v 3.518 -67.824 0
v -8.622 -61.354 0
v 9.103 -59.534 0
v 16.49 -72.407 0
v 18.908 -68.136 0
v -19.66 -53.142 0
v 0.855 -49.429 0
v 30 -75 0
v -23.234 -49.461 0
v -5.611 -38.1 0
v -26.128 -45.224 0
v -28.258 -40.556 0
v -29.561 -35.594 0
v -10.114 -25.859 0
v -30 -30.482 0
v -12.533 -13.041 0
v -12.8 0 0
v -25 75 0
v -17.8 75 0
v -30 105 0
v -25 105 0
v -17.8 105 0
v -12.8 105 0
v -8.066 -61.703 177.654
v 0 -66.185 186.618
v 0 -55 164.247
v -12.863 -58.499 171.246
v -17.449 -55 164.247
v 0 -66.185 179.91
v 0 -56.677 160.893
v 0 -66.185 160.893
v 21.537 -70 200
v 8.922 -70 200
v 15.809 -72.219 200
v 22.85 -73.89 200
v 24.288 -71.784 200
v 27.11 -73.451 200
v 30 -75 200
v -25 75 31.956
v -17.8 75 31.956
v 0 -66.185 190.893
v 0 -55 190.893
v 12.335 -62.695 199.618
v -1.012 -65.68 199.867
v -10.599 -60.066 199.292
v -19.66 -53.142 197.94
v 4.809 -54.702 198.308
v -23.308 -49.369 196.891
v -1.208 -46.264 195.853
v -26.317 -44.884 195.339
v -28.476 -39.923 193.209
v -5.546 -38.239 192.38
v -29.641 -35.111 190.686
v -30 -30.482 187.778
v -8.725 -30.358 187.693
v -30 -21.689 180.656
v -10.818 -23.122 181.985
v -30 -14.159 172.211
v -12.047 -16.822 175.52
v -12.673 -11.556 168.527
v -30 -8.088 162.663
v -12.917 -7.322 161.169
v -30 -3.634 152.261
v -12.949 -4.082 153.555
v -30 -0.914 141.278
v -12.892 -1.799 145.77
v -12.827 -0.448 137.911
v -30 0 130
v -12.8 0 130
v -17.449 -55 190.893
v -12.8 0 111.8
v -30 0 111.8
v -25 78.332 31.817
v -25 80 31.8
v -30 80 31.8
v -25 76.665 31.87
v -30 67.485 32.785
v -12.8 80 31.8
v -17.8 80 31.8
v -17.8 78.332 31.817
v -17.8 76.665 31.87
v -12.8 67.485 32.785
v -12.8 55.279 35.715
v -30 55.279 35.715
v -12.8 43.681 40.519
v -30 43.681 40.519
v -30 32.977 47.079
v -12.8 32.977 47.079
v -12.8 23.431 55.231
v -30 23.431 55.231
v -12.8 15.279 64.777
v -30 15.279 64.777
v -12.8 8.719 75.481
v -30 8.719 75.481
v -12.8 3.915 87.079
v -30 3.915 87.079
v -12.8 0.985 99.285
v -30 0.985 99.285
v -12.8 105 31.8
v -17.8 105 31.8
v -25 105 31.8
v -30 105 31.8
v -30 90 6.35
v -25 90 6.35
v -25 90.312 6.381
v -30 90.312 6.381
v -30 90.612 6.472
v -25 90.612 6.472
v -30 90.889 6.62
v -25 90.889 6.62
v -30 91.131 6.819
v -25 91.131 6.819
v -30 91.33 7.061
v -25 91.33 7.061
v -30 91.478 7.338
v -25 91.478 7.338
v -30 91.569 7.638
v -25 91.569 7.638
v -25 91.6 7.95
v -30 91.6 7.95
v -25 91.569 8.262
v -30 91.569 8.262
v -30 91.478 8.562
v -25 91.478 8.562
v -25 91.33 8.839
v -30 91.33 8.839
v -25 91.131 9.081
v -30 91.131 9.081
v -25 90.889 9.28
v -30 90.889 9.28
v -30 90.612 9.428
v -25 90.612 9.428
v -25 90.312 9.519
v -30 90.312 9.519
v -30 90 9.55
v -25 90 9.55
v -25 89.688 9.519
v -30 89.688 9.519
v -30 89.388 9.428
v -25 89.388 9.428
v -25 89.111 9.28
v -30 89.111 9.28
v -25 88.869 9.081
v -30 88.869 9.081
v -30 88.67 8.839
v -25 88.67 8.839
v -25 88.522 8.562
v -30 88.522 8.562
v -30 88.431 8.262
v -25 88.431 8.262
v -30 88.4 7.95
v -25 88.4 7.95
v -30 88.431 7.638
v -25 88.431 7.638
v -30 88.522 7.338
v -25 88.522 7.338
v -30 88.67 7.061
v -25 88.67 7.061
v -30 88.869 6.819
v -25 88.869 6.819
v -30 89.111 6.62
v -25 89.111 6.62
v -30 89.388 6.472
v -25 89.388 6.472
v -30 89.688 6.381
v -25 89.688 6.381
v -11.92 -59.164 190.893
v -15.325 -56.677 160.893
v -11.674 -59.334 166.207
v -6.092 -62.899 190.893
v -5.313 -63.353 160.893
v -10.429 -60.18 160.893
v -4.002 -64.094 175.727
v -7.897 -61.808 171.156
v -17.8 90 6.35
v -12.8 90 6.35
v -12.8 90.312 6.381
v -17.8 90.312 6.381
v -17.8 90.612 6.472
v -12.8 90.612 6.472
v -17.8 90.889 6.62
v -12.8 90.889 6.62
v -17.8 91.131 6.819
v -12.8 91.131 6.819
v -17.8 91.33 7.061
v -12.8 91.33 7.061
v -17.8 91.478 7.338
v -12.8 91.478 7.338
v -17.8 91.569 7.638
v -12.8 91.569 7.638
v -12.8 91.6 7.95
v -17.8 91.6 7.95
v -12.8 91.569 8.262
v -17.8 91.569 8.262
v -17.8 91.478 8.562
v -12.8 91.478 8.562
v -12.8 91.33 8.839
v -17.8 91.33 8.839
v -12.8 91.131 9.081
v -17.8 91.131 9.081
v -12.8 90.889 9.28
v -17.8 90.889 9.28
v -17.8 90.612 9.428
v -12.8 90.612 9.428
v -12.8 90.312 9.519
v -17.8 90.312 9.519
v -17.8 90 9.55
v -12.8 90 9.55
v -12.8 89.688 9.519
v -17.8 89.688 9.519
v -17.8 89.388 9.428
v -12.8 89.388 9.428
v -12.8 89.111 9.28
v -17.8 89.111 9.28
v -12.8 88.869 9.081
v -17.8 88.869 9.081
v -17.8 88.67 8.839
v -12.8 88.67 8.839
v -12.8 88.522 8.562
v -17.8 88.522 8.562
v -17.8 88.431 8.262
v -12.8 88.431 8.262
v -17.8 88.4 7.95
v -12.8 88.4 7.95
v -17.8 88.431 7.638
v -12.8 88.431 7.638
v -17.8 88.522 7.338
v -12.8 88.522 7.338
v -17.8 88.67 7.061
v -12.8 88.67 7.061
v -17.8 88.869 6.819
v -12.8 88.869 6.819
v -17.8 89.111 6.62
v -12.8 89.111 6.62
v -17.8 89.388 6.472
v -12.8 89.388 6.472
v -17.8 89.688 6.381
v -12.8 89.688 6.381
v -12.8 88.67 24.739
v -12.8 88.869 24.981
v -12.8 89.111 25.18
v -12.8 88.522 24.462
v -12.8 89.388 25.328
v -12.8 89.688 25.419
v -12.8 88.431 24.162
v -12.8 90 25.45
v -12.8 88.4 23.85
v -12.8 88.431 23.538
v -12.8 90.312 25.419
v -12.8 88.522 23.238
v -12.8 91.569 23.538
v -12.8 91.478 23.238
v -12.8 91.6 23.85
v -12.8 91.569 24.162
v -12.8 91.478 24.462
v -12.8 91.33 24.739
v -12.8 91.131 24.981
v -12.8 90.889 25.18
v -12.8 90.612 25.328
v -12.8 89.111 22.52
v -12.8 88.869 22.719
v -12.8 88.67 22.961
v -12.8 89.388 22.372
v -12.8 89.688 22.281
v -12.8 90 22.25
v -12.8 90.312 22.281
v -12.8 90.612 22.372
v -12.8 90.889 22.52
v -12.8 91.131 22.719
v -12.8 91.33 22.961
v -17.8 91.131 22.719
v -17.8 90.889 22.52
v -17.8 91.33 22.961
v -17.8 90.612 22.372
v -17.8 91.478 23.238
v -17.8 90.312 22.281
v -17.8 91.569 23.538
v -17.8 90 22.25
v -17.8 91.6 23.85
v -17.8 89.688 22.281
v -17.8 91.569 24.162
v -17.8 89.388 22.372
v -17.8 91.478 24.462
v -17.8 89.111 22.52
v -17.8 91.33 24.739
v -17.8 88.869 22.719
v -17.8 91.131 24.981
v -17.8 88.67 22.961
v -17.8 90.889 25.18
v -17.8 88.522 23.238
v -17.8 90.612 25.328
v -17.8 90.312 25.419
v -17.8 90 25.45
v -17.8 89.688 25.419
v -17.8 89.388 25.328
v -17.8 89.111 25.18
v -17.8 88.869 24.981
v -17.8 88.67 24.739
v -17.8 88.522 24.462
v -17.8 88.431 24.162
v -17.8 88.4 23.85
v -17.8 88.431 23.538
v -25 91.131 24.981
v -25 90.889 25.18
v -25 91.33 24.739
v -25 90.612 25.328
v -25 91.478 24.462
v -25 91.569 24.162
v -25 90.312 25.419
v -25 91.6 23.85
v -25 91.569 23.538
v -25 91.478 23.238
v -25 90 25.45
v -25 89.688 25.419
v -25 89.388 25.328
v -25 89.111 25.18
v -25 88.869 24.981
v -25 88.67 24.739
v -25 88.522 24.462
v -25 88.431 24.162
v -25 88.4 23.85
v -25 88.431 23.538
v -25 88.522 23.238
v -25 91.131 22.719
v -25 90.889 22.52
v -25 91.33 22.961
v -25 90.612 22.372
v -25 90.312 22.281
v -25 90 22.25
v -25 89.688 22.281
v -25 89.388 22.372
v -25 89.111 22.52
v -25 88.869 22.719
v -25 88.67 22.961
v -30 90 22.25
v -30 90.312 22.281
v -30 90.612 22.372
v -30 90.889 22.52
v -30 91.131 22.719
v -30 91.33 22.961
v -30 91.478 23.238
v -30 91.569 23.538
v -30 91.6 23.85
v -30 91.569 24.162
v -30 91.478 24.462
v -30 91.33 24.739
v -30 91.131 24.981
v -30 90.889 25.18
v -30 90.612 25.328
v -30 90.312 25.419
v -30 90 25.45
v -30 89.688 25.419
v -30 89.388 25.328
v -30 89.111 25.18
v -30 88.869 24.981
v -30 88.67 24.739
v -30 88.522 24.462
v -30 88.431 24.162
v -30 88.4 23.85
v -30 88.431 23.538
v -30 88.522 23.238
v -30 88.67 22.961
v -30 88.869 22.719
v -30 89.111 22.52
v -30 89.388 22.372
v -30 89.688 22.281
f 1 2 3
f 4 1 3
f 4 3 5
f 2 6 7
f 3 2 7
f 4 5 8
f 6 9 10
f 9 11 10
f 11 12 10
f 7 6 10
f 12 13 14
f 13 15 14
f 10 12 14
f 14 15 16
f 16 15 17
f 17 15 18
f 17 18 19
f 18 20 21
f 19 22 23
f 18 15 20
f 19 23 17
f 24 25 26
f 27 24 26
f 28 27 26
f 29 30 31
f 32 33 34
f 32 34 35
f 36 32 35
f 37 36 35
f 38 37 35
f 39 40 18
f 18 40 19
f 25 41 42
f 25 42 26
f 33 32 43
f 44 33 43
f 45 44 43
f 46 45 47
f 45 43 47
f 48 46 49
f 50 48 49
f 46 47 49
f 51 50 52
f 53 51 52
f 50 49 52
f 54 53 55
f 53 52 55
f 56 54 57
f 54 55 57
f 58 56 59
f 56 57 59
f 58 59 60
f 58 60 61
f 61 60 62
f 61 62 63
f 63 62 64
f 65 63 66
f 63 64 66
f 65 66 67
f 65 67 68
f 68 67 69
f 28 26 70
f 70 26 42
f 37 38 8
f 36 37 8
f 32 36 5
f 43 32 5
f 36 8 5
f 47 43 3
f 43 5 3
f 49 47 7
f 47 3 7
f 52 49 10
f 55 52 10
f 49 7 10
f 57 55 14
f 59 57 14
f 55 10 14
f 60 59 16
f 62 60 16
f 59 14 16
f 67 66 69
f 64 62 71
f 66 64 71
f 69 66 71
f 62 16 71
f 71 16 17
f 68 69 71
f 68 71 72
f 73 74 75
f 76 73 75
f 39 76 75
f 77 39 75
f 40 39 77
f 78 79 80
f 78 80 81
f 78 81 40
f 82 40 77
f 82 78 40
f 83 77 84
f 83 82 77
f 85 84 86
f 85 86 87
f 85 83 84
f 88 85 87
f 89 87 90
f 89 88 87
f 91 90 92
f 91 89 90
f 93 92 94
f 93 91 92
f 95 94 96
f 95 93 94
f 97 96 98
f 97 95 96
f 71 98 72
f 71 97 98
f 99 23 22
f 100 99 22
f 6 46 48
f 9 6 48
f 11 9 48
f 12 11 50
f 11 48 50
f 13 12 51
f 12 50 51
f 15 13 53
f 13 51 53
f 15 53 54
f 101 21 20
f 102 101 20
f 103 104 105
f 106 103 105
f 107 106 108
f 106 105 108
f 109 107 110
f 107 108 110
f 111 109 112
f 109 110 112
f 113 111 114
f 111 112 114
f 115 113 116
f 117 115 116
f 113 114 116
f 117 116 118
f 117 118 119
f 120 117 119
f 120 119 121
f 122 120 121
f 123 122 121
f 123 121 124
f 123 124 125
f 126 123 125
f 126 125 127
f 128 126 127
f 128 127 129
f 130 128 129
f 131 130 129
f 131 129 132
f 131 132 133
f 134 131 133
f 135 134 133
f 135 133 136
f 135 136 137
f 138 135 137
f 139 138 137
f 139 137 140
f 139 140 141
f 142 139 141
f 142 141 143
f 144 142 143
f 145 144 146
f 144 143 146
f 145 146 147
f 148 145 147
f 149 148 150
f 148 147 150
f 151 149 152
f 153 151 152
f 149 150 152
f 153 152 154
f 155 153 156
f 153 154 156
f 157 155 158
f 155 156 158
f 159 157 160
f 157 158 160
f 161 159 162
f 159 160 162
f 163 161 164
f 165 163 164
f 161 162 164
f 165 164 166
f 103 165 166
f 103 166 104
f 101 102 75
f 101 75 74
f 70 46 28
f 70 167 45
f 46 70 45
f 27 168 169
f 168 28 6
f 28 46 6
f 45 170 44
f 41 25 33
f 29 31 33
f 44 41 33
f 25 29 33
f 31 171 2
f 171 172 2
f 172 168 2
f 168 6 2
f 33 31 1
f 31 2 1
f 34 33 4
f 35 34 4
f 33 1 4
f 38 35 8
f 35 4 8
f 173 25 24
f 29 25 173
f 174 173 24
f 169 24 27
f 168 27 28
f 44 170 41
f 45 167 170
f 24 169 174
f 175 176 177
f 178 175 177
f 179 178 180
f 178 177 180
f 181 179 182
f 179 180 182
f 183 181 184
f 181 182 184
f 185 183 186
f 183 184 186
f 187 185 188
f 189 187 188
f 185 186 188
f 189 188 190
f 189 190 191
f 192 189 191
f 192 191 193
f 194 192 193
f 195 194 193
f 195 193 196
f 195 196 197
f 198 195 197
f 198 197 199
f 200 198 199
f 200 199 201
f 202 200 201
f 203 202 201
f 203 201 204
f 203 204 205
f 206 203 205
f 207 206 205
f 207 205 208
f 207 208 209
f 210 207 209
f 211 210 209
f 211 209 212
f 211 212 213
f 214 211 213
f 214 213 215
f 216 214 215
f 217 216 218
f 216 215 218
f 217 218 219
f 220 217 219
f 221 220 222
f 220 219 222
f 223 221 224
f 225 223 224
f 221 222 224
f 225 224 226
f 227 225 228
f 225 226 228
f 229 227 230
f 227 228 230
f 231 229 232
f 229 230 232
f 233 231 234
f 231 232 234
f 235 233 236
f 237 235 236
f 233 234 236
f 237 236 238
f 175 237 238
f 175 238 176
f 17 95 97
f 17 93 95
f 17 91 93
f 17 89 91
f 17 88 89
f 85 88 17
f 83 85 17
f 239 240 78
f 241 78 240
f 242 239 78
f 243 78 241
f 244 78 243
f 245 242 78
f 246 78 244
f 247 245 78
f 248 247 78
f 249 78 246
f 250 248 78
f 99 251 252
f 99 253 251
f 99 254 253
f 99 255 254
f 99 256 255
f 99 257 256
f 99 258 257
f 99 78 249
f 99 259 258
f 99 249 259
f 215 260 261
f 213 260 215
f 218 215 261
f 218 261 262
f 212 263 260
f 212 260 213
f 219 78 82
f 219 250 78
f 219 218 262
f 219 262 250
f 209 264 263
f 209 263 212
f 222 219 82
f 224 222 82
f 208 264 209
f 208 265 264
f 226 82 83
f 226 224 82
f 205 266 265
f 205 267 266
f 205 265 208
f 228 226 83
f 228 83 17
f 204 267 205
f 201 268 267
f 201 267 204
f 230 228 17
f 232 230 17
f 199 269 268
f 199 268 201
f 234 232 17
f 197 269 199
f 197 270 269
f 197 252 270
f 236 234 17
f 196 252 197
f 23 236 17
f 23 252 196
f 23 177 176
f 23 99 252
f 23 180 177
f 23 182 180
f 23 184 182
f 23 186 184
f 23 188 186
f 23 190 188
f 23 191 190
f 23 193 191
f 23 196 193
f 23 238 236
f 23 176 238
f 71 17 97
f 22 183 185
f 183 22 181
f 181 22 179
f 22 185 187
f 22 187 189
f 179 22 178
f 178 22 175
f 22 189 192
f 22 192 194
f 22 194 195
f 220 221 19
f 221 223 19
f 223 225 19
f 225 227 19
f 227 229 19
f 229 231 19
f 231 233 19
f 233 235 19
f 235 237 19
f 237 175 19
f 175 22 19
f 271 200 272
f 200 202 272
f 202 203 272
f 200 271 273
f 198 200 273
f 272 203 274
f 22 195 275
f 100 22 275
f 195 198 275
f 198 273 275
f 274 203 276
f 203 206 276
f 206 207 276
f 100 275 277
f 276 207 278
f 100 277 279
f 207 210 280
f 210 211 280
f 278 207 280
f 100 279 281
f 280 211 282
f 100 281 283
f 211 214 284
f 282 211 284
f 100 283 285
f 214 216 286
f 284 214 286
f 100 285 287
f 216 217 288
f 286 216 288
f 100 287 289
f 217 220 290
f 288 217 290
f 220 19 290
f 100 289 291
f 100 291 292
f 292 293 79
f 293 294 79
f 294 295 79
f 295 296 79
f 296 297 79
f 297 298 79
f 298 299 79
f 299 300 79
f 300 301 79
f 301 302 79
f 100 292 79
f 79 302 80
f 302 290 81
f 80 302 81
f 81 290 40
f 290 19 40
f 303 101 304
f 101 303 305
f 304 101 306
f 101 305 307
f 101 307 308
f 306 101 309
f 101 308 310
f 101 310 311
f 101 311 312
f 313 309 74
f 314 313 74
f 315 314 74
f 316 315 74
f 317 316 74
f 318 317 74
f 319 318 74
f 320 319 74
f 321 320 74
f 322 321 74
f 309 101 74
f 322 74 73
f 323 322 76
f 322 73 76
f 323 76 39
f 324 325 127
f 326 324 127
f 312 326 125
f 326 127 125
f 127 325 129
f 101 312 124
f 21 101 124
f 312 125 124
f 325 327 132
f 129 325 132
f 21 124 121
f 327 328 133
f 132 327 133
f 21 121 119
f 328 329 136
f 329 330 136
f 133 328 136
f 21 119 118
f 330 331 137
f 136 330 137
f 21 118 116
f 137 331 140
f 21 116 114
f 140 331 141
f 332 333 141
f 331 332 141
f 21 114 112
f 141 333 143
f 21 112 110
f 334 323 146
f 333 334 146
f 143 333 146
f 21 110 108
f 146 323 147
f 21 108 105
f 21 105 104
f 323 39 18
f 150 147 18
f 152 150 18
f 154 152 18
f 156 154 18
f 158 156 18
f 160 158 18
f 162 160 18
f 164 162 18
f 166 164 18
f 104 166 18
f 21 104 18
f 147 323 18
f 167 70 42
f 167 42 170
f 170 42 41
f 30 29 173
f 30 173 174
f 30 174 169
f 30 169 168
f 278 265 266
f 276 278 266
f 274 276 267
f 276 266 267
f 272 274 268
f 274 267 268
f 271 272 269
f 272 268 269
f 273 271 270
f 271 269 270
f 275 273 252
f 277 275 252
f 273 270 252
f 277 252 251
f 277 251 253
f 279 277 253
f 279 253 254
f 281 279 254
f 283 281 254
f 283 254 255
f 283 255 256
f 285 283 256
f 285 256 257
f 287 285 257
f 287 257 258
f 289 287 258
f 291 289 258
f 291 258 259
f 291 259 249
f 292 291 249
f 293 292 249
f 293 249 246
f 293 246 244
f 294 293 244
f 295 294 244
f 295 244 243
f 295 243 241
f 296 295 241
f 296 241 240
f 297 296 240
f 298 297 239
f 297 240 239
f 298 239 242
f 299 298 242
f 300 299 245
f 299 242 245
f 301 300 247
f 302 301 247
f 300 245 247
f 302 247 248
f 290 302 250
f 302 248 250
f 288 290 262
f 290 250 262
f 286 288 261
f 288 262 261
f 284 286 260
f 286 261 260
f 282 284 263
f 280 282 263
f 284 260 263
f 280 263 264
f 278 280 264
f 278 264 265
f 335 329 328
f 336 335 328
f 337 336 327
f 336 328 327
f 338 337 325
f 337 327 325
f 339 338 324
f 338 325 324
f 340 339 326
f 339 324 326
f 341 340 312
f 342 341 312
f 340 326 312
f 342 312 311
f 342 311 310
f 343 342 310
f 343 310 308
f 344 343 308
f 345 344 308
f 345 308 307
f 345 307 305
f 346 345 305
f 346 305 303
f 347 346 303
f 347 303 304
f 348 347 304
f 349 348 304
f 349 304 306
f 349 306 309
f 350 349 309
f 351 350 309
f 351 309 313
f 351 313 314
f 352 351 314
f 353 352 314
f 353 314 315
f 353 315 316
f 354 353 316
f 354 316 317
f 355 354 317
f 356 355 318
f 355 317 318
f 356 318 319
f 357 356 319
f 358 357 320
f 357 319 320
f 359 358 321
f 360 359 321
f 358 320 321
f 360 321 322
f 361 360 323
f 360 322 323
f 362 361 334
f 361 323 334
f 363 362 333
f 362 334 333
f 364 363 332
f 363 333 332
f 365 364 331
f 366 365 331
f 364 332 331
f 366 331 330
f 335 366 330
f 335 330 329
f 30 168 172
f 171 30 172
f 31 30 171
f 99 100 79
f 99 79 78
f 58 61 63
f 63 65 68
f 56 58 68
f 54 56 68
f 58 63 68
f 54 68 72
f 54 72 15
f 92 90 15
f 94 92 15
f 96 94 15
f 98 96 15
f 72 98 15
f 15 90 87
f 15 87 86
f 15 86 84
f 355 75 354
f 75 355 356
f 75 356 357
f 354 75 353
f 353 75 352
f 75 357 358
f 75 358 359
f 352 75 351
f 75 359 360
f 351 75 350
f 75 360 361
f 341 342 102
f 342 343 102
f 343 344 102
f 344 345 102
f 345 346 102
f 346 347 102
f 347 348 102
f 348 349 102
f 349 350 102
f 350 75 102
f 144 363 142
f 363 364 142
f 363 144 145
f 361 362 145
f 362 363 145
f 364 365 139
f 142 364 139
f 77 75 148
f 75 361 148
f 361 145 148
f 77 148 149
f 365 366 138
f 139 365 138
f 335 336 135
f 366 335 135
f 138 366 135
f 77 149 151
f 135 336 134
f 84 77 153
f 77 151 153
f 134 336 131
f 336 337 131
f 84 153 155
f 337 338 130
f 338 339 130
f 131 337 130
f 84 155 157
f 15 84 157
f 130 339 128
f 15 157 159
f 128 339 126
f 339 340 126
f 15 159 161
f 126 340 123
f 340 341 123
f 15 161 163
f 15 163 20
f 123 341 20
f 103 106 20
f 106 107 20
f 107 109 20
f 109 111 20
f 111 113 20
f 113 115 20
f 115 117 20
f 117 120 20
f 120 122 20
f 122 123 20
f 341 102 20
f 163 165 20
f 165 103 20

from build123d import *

# Parameters (mm, degrees)
RESSALTO_EXTRUS_O1_DEPTH = 31.8
RESSALTO_EXTRUS_O2_START = 31.8
RESSALTO_EXTRUS_O2_DEPTH = 168.2
FILETE1_R                = 80
FILETE2_R                = 30
FILETE3_R                = 70
ESBO_O2_R                = 1.6
CORTE_EXTRUS_O2_DEPTH    = 228.870577403


with BuildPart() as part:
    # Esboço1 → Ressalto-extrusão1 (new body)
    with BuildSketch(Plane.XY):
        Polygon((-17.8, 75), (-25, 75), (-25, 105), (-30, 105), (-30, 75), (-30, 0), (-12.8, 0), (-12.8, 75), (-12.8, 105), (-17.8, 105), align=None)
        with BuildLine():
            Line((-12.8, 0), (-30, 0))
            Line((-30, 0), (-30, -42.598518169))
            ThreePointArc((-30, -42.598518169), (-3.119977625, -64.576731192), (30, -75))
            ThreePointArc((30, -75), (-2.613275136, -43.899042345), (-12.8, 0))
        make_face()
    extrude(amount=RESSALTO_EXTRUS_O1_DEPTH)

    # Esboço1<4> → Ressalto-extrusão2 (add)
    with BuildSketch(Plane.XY.offset(RESSALTO_EXTRUS_O2_START)):
        with BuildLine():
            Line((-12.8, 0), (-30, 0))
            Line((-30, 0), (-30, -42.598518169))
            ThreePointArc((-30, -42.598518169), (-3.119977625, -64.576731192), (30, -75))
            ThreePointArc((30, -75), (-2.613275136, -43.899042345), (-12.8, 0))
        make_face()
    extrude(amount=RESSALTO_EXTRUS_O2_DEPTH)

    # Filete1
    # the kernel refuses this fillet: 80 mm, written as the material it adds along each edge
    with BuildSketch(Plane(origin=(-12.8, 0, 31.8), x_dir=(0, 0, 1), z_dir=(-1, 0, 0))) as filete1_piece_1_section:
        with BuildLine():
            CenterArc((FILETE1_R, FILETE1_R), FILETE1_R, 180, 90)
            Line((0, FILETE1_R), (0, 0))
            Line((0, 0), (FILETE1_R, 0))
        make_face()
    filete1_piece_1 = extrude(amount=17.2, mode=Mode.PRIVATE)
    filete1_piece_1 = filete1_piece_1 - Plane(origin=(65.698057665, -4.916041759, 49.992599302), x_dir=(-0.4538743908259289, -0.8910656751061574, 0), z_dir=(0, 0, -1)) * Cylinder(78.65184374, 355, mode=Mode.PRIVATE)
    filete1_piece_1 = split(filete1_piece_1, bisect_by=Plane(origin=(-15.301775564, 75, 49.992599302), z_dir=(0, -1, 0)), keep=Keep.TOP, mode=Mode.PRIVATE)
    filete1_piece_1 = split(filete1_piece_1, bisect_by=Plane(origin=(-17.8, 17.823232591, 49.992599302), z_dir=(1, 0, 0)), keep=Keep.TOP, mode=Mode.PRIVATE)
    add(filete1_piece_1)
    with BuildSketch(Plane(origin=(-12.8, 0, 31.8), x_dir=(0, 0, 1), z_dir=(-1, 0, 0))) as filete1_piece_2_section:
        with BuildLine():
            CenterArc((FILETE1_R, FILETE1_R), FILETE1_R, 180, 90)
            Line((0, FILETE1_R), (0, 0))
            Line((0, 0), (FILETE1_R, 0))
        make_face()
    filete1_piece_2 = extrude(amount=17.2, mode=Mode.PRIVATE)
    filete1_piece_2 = split(filete1_piece_2, bisect_by=Plane(origin=(-15.3, 75, 31.026714825), z_dir=(0, 1, 0)), keep=Keep.TOP, mode=Mode.PRIVATE)
    filete1_piece_2 = split(filete1_piece_2, bisect_by=Plane(origin=(-17.8, 77.46056258, 31.026714825), z_dir=(1, 0, 0)), keep=Keep.TOP, mode=Mode.PRIVATE)
    add(filete1_piece_2)
    with BuildSketch(Plane(origin=(-12.8, 0, 31.8), x_dir=(0, 0, 1), z_dir=(-1, 0, 0))) as filete1_piece_3_section:
        with BuildLine():
            CenterArc((FILETE1_R, FILETE1_R), FILETE1_R, 180, 90)
            Line((0, FILETE1_R), (0, 0))
            Line((0, 0), (FILETE1_R, 0))
        make_face()
    filete1_piece_3 = extrude(amount=17.2, mode=Mode.PRIVATE)
    filete1_piece_3 = split(filete1_piece_3, bisect_by=Plane(origin=(-25, 17.809681015, 50.007682963), z_dir=(1, 0, 0)), keep=Keep.TOP, mode=Mode.PRIVATE)
    filete1_piece_3 = split(filete1_piece_3, bisect_by=Plane(origin=(-21.4, 75, 50.007682963), z_dir=(0, -1, 0)), keep=Keep.TOP, mode=Mode.PRIVATE)
    filete1_piece_3 = split(filete1_piece_3, bisect_by=Plane(origin=(-17.8, 17.809681015, 50.007682963), z_dir=(-1, 0, 0)), keep=Keep.TOP, mode=Mode.PRIVATE)
    add(filete1_piece_3)
    with BuildSketch(Plane(origin=(-12.8, 0, 31.8), x_dir=(0, 0, 1), z_dir=(-1, 0, 0))) as filete1_piece_4_section:
        with BuildLine():
            CenterArc((FILETE1_R, FILETE1_R), FILETE1_R, 180, 90)
            Line((0, FILETE1_R), (0, 0))
            Line((0, 0), (FILETE1_R, 0))
        make_face()
    filete1_piece_4 = extrude(amount=17.2, mode=Mode.PRIVATE)
    filete1_piece_4 = split(filete1_piece_4, bisect_by=Plane(origin=(-25, 17.809681015, 50.007682963), z_dir=(-1, 0, 0)), keep=Keep.TOP, mode=Mode.PRIVATE)
    filete1_piece_4 = split(filete1_piece_4, bisect_by=Plane(origin=(-27.5, 75, 50.007682963), z_dir=(0, -1, 0)), keep=Keep.TOP, mode=Mode.PRIVATE)
    add(filete1_piece_4)
    with BuildSketch(Plane(origin=(-12.8, 0, 31.8), x_dir=(0, 0, 1), z_dir=(-1, 0, 0))) as filete1_piece_5_section:
        with BuildLine():
            CenterArc((FILETE1_R, FILETE1_R), FILETE1_R, 180, 90)
            Line((0, FILETE1_R), (0, 0))
            Line((0, 0), (FILETE1_R, 0))
        make_face()
    filete1_piece_5 = extrude(amount=17.2, mode=Mode.PRIVATE)
    filete1_piece_5 = split(filete1_piece_5, bisect_by=Plane(origin=(-25, 77.46056258, 31.026714825), z_dir=(-1, 0, 0)), keep=Keep.TOP, mode=Mode.PRIVATE)
    filete1_piece_5 = split(filete1_piece_5, bisect_by=Plane(origin=(-27.5, 75, 31.026714825), z_dir=(0, 1, 0)), keep=Keep.TOP, mode=Mode.PRIVATE)
    add(filete1_piece_5)

    # Filete2
    filete2_edges = [part.edges().sort_by_distance(p)[0] for p in [
        (-30, -42.598518169, 100),
    ]]
    fillet(filete2_edges, radius=FILETE2_R)

    # Filete3
    # the kernel refuses this fillet: 70 mm, written as the material it takes off along each edge
    with BuildSketch(Plane(origin=(162.2, 0, 200), x_dir=(0, -1, 0), z_dir=(-1, 0, 0))) as filete3_piece_1:
        with BuildLine():
            CenterArc((FILETE3_R, -FILETE3_R), FILETE3_R, 90, 90)
            Line((0, -FILETE3_R), (0, 0))
            Line((0, 0), (FILETE3_R, 0))
        make_face()
    extrude(amount=367.2, mode=Mode.SUBTRACT)

    # Esboço2 → Corte-extrusão2 (cut, through all)
    with BuildSketch(Plane(origin=(0, 0, 0), x_dir=(0, 0, -1), z_dir=(1, 0, 0))):
        with Locations((-23.85, 90)):
            Circle(ESBO_O2_R)
        with Locations((-7.95, 90)):
            Circle(ESBO_O2_R)
        Polygon((-187.539156299, -70), (-160.893258266, -56.677050983), (-160.893258266, -70), align=None)
        Polygon((-190.893258266, -68.322949017), (-164.247360232, -55), (-190.893258266, -55), align=None)
    extrude(amount=-CORTE_EXTRUS_O2_DEPTH, mode=Mode.SUBTRACT)


solid = part.part
